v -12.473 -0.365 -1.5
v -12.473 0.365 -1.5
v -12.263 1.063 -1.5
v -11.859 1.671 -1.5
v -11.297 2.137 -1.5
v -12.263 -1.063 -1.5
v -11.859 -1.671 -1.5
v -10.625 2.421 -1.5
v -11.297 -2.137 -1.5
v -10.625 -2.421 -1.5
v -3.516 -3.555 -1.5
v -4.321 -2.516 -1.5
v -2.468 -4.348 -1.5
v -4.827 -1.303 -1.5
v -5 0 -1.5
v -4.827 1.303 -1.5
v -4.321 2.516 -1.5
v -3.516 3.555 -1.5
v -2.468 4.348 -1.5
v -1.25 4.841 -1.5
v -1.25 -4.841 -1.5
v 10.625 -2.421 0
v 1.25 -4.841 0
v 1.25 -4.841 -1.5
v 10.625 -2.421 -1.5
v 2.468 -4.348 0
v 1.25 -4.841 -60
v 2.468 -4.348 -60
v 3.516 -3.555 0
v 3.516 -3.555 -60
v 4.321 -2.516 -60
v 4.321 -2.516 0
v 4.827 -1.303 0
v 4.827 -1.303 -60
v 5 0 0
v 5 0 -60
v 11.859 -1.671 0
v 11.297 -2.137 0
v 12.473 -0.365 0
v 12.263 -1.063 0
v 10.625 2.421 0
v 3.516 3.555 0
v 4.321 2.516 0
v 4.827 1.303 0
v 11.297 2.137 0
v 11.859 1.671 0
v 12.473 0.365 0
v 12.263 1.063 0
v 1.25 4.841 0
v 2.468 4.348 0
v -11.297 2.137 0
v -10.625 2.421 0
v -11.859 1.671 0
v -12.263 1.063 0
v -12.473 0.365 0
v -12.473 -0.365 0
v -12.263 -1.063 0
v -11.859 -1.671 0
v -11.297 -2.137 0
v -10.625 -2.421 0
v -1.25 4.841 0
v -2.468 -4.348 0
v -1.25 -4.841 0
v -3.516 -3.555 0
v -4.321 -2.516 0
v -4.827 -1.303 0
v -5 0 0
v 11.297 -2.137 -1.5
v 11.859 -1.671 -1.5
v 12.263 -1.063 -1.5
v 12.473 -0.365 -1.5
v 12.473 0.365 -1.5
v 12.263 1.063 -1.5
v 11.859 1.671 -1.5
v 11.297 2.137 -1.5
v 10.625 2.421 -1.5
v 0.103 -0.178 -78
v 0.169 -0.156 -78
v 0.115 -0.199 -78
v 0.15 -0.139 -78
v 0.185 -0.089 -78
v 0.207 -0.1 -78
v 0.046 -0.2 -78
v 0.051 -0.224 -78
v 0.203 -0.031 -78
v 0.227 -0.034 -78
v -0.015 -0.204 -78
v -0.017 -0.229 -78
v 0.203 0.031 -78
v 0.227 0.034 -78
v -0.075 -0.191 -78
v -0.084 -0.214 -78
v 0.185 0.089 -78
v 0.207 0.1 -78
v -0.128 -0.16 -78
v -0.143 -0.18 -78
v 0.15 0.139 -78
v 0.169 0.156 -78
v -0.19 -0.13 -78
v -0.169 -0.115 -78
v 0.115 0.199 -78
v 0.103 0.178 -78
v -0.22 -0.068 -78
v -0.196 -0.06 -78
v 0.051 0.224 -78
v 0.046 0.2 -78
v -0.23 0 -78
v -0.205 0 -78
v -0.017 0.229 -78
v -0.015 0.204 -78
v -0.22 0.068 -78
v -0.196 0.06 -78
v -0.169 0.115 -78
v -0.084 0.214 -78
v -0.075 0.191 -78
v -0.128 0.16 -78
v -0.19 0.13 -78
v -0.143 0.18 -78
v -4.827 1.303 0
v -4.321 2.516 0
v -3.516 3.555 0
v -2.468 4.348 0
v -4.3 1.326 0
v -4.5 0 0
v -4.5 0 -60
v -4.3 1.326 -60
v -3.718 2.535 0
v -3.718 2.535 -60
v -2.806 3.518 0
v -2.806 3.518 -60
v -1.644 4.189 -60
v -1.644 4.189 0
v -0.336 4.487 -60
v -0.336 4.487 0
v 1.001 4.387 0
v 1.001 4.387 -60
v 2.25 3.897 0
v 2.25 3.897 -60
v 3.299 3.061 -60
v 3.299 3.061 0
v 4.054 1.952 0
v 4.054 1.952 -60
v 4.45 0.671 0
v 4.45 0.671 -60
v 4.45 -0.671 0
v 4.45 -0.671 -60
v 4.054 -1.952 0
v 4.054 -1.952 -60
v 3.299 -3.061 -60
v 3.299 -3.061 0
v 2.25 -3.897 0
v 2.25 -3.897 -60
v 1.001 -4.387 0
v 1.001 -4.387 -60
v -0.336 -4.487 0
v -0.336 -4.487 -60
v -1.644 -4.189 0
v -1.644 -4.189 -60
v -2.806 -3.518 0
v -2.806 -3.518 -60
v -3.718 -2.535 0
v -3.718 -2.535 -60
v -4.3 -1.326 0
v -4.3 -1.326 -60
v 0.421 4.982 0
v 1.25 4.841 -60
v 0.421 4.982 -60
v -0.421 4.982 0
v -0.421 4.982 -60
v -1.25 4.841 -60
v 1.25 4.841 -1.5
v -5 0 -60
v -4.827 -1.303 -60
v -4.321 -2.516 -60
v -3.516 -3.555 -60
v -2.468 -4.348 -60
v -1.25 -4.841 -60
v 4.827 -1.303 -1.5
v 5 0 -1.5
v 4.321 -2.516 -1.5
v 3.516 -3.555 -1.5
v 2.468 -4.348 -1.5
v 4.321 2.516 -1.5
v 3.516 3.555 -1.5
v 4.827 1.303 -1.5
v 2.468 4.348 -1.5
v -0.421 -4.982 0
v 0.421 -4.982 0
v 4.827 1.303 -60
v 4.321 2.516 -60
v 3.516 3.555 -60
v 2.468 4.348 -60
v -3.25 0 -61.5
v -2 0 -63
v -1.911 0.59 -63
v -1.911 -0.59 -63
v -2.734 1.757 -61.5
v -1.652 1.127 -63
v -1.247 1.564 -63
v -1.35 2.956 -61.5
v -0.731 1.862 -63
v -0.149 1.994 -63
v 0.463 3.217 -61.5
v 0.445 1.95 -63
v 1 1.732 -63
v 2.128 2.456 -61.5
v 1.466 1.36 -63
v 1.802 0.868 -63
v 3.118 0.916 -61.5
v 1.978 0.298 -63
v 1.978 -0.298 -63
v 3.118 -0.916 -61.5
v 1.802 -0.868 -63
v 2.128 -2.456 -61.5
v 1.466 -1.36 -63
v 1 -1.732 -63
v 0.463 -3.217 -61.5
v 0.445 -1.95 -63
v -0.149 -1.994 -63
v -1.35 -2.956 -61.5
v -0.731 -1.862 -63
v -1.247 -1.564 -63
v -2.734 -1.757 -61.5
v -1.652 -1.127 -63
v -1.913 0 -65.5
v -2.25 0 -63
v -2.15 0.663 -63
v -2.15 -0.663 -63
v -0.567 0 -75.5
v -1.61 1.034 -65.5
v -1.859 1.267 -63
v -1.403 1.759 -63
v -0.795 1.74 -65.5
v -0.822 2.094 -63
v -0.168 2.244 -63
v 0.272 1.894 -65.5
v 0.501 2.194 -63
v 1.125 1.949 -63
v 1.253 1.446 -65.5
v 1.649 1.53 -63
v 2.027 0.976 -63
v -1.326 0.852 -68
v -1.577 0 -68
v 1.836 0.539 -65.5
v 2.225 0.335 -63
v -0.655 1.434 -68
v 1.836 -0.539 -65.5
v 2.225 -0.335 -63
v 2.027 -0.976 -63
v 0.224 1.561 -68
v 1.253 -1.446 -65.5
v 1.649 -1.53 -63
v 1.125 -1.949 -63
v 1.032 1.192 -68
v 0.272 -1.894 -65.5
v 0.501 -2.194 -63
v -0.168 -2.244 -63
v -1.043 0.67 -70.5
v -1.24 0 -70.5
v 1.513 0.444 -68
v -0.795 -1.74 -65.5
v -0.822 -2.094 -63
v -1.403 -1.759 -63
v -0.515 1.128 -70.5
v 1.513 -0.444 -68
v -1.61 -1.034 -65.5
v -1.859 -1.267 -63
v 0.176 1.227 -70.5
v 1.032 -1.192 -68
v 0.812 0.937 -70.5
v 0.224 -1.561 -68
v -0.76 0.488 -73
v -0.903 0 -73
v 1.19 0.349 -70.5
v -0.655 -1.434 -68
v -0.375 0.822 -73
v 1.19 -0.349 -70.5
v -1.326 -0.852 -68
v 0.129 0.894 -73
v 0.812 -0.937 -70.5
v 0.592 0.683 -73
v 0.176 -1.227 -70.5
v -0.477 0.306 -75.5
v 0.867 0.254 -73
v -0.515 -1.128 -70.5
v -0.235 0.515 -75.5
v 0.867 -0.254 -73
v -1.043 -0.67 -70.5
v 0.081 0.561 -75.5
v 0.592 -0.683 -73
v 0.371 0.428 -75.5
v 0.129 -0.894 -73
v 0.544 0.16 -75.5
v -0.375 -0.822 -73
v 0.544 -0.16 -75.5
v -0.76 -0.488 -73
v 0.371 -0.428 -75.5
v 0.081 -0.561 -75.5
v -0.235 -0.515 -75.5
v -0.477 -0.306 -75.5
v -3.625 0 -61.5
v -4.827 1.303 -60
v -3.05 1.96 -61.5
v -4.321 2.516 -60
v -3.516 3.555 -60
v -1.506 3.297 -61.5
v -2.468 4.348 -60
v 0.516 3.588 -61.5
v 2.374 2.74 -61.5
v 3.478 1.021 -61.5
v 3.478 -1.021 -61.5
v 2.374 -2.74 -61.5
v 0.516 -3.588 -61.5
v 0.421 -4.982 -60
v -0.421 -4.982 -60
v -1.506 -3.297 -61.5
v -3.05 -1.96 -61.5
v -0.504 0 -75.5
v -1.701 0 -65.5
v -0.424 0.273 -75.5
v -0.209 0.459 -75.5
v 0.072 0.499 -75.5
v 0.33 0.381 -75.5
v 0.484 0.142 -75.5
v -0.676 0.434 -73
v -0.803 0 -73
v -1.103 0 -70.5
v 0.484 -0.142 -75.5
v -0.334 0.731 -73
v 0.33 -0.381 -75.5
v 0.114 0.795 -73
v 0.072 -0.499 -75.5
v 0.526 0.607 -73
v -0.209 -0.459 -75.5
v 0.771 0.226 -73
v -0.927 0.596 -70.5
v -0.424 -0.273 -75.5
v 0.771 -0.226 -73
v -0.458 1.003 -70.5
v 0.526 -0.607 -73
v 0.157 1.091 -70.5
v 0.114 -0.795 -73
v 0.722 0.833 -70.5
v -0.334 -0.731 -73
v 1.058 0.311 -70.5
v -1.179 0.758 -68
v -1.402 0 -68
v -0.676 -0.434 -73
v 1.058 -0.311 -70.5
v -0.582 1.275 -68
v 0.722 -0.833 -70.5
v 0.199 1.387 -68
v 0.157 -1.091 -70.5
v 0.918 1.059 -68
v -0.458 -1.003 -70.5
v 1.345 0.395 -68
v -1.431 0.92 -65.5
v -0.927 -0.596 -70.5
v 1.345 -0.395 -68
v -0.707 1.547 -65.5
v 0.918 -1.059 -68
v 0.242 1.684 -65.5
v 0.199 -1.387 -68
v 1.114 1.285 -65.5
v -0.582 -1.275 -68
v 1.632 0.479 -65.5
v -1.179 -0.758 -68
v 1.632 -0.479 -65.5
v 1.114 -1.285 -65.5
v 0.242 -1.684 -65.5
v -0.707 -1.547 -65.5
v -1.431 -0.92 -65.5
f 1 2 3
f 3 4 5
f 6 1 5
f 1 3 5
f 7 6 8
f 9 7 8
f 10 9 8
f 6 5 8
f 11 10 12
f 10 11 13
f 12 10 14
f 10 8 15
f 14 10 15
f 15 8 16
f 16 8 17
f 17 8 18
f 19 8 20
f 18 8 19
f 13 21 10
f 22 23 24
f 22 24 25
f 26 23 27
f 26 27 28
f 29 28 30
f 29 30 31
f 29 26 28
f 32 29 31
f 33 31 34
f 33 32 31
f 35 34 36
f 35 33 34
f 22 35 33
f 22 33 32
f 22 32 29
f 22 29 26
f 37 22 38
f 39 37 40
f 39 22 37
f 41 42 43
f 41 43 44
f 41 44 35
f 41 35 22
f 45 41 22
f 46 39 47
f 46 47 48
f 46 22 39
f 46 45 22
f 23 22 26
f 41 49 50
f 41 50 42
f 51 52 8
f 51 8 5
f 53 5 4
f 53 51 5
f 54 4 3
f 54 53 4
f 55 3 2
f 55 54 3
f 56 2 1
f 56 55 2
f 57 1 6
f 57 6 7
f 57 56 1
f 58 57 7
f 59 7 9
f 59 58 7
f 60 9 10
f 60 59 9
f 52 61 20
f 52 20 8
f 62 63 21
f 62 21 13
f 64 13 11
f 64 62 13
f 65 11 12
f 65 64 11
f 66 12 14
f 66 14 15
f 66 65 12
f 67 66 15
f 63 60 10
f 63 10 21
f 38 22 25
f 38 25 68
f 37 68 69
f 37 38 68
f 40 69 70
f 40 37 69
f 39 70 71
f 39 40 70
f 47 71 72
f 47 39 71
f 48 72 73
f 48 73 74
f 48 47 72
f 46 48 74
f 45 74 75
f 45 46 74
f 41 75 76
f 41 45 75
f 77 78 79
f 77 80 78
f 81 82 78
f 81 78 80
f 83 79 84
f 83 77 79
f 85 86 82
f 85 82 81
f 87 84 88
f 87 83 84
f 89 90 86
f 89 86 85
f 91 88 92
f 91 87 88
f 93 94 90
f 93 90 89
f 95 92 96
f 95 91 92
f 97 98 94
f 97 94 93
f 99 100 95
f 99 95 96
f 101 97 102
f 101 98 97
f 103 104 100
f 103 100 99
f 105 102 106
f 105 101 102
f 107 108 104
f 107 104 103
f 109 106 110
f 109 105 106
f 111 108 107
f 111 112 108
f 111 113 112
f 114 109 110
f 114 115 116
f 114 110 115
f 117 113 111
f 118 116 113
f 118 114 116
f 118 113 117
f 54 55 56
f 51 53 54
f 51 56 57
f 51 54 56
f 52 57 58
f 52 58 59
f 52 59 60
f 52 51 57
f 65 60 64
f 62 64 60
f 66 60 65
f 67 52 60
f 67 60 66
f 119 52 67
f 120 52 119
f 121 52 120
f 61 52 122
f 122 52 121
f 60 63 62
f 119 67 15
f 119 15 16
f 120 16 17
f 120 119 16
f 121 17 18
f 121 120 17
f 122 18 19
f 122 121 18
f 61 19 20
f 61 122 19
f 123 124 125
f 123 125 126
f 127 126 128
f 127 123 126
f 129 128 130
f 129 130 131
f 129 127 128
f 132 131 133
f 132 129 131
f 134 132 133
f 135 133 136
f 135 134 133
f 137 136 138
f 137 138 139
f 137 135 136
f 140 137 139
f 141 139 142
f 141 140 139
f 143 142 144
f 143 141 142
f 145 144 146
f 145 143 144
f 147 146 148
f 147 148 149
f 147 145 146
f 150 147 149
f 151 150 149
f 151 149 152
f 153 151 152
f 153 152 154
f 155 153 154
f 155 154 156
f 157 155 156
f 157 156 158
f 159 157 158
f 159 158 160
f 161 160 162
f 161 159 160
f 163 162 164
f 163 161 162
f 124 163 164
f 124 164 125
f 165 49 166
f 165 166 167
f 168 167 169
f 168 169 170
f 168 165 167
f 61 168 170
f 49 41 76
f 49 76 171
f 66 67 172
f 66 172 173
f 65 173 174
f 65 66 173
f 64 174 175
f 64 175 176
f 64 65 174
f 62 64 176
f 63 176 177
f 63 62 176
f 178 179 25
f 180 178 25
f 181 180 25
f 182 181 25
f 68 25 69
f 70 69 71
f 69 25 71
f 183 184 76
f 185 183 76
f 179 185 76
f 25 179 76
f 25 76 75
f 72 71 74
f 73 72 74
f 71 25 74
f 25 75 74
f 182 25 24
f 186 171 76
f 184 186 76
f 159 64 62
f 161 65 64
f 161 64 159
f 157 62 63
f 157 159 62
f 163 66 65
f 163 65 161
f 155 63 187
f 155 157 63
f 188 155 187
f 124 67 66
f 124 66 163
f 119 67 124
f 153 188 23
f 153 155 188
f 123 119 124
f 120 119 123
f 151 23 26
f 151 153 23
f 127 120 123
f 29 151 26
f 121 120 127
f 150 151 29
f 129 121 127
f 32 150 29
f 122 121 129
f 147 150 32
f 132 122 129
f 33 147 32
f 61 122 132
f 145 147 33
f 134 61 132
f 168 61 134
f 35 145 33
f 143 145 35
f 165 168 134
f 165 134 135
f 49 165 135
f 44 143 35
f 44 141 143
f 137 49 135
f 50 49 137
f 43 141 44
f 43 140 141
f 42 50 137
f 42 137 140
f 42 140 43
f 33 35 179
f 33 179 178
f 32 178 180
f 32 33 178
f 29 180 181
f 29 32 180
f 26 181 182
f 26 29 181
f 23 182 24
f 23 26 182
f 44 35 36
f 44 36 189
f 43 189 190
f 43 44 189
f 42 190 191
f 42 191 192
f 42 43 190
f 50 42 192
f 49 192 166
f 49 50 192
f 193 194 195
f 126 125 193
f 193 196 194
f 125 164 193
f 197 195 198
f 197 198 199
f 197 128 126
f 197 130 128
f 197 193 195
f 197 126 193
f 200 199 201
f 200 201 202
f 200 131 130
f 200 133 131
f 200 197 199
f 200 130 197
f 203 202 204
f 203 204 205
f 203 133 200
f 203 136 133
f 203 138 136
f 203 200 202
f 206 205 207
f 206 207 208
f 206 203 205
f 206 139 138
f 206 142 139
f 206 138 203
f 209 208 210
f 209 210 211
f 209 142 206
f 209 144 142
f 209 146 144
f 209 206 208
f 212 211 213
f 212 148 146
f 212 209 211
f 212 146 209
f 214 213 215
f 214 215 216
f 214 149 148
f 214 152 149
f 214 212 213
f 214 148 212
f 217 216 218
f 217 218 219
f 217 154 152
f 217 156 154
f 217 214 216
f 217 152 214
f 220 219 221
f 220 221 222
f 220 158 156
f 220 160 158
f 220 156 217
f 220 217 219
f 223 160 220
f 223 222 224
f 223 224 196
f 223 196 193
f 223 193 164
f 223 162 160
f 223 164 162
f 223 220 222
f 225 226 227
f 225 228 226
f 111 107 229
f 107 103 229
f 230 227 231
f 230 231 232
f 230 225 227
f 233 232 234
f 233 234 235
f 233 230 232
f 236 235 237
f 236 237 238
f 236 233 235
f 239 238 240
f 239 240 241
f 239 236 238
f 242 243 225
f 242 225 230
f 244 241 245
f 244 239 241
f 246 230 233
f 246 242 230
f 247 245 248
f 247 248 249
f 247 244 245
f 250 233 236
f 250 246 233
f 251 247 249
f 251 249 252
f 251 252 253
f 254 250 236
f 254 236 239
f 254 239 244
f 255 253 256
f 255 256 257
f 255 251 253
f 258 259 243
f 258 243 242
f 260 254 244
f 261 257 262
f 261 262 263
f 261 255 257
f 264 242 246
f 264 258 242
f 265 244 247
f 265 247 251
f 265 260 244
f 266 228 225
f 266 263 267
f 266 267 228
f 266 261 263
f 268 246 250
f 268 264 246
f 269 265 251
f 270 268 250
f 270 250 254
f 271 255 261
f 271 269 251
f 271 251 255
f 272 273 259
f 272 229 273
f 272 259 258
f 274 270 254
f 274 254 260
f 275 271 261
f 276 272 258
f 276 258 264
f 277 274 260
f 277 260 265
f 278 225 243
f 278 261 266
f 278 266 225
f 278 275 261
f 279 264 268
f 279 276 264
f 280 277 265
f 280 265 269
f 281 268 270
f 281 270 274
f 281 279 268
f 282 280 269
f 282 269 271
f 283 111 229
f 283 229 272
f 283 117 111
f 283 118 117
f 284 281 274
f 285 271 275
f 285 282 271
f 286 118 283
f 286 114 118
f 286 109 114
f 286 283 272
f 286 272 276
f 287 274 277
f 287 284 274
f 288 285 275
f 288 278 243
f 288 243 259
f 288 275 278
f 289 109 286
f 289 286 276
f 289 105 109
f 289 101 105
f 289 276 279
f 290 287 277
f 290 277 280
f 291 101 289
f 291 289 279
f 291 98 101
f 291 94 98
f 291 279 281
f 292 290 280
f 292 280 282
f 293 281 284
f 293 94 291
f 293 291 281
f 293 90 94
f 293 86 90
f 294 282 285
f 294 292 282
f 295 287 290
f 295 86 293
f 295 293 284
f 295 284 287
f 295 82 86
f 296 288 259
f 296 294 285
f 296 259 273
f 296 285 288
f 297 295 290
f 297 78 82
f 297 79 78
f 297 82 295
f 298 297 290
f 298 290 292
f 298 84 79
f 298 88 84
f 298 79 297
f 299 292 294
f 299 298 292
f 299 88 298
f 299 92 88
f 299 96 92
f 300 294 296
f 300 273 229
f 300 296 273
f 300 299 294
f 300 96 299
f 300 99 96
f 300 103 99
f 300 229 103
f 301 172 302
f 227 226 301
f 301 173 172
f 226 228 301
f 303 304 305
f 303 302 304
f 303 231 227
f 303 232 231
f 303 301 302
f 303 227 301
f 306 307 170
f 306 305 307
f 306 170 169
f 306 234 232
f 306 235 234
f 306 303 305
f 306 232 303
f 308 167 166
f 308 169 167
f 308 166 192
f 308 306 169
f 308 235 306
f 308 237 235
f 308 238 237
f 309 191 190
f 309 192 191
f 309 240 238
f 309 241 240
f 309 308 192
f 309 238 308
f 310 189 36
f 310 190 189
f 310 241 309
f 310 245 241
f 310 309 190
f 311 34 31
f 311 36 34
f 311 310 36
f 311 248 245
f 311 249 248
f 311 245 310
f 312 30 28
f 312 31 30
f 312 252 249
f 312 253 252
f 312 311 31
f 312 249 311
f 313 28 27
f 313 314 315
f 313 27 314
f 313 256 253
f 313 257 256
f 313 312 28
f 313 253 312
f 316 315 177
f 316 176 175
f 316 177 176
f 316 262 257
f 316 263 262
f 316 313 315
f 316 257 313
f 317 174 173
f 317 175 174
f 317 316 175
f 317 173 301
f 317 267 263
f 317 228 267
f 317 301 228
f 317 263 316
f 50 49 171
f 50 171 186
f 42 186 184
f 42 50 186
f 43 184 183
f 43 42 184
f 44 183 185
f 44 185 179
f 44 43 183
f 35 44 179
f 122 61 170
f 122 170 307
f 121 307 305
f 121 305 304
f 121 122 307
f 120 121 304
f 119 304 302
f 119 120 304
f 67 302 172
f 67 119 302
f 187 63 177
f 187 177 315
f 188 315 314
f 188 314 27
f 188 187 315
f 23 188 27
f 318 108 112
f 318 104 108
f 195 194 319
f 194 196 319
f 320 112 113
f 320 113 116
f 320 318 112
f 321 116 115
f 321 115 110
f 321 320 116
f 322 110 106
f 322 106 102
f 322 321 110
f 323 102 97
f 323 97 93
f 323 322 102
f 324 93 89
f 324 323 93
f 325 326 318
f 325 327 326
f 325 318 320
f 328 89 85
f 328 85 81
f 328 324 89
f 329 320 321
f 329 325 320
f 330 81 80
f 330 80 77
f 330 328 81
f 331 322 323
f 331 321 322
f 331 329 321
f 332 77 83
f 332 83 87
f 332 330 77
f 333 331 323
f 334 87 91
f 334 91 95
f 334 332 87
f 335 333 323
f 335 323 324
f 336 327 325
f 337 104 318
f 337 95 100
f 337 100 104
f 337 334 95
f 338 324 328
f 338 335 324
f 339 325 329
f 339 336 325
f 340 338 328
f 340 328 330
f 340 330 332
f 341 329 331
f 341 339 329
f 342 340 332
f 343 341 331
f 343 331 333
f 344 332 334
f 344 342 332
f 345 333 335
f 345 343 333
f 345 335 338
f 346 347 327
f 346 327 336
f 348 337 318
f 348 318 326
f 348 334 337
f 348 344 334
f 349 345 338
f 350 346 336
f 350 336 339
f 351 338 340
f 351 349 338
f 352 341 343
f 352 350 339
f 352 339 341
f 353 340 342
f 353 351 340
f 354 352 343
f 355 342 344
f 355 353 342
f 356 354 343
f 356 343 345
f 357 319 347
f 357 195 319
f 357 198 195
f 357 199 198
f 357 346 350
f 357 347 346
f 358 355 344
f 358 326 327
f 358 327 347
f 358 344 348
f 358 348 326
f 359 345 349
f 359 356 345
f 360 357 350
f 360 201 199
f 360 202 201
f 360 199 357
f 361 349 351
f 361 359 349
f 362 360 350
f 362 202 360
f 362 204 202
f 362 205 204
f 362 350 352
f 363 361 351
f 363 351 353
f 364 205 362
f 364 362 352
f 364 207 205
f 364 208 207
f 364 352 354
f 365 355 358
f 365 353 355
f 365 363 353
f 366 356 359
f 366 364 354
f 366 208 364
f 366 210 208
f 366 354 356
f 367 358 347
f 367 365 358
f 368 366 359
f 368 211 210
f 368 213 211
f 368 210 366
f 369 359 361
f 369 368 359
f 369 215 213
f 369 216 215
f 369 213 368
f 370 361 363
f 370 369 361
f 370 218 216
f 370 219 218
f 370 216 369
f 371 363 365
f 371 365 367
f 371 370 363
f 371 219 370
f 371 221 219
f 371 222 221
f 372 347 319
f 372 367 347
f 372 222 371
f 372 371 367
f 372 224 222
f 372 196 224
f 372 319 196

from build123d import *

# Parameters (mm, degrees)
F1_DEPTH = 1.5
F3_DEPTH = 60


with BuildPart() as f1:
    # F0 (on Top) → F1 (new body)
    with BuildSketch(Plane.XY):
        with BuildLine():
            ThreePointArc((-5, 0), (-3.9528470752, 3.0618621785), (-1.25, 4.8412291828))
            Line((-1.25, 4.8412291828), (-10.625, 2.4206145914))
            ThreePointArc((-10.625, 2.4206145914), (-12.5, 0), (-10.625, -2.4206145914))
            Line((-10.625, -2.4206145914), (-1.25, -4.8412291828))
            ThreePointArc((-1.25, -4.8412291828), (-3.9528470752, -3.0618621785), (-5, 0))
        make_face()
    extrude(amount=-F1_DEPTH)


with BuildPart() as f1b:
    # F0 (on Top) → F1, piece 2 (new body)
    with BuildSketch(Plane.XY):
        with BuildLine():
            ThreePointArc((1.25, 4.8412291828), (3.9528470752, 3.0618621785), (5, 0))
            ThreePointArc((5, 0), (3.9528470752, -3.0618621785), (1.25, -4.8412291828))
            Line((1.25, -4.8412291828), (10.625, -2.4206145914))
            ThreePointArc((10.625, -2.4206145914), (12.5, 0), (10.625, 2.4206145914))
            Line((10.625, 2.4206145914), (1.25, 4.8412291828))
        make_face()
    extrude(amount=-F1_DEPTH)


with BuildPart() as f3:
    # F0 (on Top) → F3 (new body)
    with BuildSketch(Plane.XY):
        with BuildLine():
            ThreePointArc((1.25, -4.8412291828), (3.9528470752, -3.0618621785), (5, 0))
            Line((5, 0), (4.5, 0))
            ThreePointArc((4.5, 0), (0, -4.5), (-4.5, 0))
            Line((-4.5, 0), (-5, 0))
            ThreePointArc((-5, 0), (-3.9528470752, -3.0618621785), (-1.25, -4.8412291828))
            ThreePointArc((-1.25, -4.8412291828), (0, -5), (1.25, -4.8412291828))
        make_face()
        with BuildLine():
            Line((4.5, 0), (5, 0))
            ThreePointArc((5, 0), (3.9528470752, 3.0618621785), (1.25, 4.8412291828))
            ThreePointArc((1.25, 4.8412291828), (0, 5), (-1.25, 4.8412291828))
            ThreePointArc((-1.25, 4.8412291828), (-3.9528470752, 3.0618621785), (-5, 0))
            Line((-5, 0), (-4.5, 0))
            ThreePointArc((-4.5, 0), (0, 4.5), (4.5, 0))
        make_face()
    extrude(amount=-F3_DEPTH)

    # F10 (on Front) → F11 (revolve)
    with BuildSketch(Plane.XZ):
        Polygon((-4.5, -60), (-5, -60), (-2.25, -63), (-2, -63), align=None)
    revolve(axis=Axis((0, 0, -69), (0, 0, -1)))

    # F10 (on Front) → F12 (revolve)
    with BuildSketch(Plane.XZ):
        Polygon((-2, -63), (-2.25, -63), (-0.23, -78), (-0.205, -78), align=None)
    revolve(axis=Axis((0, 0, -69), (0, 0, -1)))


solid = Compound([f1.part, f1b.part, f3.part])
